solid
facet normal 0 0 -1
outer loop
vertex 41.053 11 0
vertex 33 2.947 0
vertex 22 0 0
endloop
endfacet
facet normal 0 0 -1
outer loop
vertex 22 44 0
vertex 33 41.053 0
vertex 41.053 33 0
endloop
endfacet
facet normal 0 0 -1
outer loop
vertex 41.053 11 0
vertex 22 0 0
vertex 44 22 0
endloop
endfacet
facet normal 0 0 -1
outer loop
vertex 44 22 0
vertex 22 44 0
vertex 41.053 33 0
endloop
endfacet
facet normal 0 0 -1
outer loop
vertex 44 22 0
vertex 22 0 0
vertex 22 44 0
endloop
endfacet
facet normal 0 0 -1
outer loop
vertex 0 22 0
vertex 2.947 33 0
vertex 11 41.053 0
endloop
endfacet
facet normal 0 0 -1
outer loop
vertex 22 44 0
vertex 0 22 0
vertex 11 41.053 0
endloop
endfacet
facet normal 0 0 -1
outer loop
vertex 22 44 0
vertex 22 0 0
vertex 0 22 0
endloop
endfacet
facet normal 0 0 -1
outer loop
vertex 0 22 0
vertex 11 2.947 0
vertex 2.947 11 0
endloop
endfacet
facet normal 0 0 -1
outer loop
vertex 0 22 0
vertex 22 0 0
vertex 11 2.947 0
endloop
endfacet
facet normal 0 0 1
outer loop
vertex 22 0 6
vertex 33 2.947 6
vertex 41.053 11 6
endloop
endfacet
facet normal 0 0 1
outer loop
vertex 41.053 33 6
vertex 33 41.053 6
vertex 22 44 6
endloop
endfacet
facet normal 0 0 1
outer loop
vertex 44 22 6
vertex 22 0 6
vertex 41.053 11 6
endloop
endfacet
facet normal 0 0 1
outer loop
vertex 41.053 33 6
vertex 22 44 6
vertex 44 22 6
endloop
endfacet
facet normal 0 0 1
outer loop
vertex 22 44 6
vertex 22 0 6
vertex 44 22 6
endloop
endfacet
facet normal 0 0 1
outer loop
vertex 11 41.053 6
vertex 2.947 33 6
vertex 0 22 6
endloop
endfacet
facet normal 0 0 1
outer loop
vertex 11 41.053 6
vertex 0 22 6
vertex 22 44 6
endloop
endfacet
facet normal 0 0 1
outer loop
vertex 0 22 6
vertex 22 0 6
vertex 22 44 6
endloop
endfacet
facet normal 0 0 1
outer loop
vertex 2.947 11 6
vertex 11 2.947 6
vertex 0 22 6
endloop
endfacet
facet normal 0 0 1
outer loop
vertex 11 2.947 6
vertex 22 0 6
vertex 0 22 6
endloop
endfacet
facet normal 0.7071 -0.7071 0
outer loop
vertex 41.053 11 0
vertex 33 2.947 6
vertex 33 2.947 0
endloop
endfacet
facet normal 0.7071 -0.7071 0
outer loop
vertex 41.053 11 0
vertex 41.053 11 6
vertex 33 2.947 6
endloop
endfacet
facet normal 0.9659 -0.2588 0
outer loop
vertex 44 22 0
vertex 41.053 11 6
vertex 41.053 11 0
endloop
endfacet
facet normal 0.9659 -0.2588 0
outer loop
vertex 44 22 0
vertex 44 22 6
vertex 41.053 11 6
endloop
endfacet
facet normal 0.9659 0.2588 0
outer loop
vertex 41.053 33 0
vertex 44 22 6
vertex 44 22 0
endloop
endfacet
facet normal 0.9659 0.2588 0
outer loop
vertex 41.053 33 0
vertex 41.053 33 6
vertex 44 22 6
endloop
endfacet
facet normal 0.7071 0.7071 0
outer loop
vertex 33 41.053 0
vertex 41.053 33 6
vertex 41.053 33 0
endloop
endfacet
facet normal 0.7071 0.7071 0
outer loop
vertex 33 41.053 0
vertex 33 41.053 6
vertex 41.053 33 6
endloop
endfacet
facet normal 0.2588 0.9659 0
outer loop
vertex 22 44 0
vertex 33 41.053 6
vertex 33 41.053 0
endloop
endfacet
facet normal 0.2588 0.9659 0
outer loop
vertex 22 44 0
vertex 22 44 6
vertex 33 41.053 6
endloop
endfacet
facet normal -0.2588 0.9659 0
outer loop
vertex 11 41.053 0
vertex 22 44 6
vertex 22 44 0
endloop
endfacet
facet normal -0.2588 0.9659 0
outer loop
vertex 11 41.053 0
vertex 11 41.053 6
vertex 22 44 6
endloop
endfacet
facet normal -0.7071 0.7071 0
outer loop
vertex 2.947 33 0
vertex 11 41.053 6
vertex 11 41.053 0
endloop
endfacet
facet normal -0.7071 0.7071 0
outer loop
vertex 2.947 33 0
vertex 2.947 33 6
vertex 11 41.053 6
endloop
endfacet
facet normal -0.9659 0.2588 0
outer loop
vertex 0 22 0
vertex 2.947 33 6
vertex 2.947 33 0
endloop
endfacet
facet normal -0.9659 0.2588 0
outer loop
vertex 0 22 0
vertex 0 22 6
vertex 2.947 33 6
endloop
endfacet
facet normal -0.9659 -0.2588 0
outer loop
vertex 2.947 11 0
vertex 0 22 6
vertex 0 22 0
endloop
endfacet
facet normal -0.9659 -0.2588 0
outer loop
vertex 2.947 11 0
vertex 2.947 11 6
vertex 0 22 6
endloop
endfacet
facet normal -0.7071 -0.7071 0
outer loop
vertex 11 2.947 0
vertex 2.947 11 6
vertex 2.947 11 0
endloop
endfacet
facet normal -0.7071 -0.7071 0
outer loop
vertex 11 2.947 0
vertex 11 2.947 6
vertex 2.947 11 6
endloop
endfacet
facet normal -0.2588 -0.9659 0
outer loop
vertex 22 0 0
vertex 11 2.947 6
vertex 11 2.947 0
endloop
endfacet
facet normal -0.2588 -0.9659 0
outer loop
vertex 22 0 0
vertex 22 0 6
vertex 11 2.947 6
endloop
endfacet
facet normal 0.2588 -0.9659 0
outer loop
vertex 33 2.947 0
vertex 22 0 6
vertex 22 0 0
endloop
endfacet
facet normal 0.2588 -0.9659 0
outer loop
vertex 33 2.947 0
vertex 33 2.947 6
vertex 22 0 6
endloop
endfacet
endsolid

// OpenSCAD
$fn = 32;

// ----------------------------------------------------------------------
// Eccentric disc: egg, 6 mm thick
// ----------------------------------------------------------------------

// --- parameters (mm) ---
profile_height = 6;       // extrusion height
profile_points = 12;      // points of the closed outline

profile = [[0, 22], [2.947, 11], [11, 2.947], [22, 0], [33, 2.947], [41.053, 11], [44, 22], [41.053, 33], [33, 41.053], [22, 44], [11, 41.053], [2.947, 33]];  // single closed polygon, 12 points, counter clockwise

// --- the one profile operation ---
linear_extrude(height = profile_height) polygon(points = profile);
